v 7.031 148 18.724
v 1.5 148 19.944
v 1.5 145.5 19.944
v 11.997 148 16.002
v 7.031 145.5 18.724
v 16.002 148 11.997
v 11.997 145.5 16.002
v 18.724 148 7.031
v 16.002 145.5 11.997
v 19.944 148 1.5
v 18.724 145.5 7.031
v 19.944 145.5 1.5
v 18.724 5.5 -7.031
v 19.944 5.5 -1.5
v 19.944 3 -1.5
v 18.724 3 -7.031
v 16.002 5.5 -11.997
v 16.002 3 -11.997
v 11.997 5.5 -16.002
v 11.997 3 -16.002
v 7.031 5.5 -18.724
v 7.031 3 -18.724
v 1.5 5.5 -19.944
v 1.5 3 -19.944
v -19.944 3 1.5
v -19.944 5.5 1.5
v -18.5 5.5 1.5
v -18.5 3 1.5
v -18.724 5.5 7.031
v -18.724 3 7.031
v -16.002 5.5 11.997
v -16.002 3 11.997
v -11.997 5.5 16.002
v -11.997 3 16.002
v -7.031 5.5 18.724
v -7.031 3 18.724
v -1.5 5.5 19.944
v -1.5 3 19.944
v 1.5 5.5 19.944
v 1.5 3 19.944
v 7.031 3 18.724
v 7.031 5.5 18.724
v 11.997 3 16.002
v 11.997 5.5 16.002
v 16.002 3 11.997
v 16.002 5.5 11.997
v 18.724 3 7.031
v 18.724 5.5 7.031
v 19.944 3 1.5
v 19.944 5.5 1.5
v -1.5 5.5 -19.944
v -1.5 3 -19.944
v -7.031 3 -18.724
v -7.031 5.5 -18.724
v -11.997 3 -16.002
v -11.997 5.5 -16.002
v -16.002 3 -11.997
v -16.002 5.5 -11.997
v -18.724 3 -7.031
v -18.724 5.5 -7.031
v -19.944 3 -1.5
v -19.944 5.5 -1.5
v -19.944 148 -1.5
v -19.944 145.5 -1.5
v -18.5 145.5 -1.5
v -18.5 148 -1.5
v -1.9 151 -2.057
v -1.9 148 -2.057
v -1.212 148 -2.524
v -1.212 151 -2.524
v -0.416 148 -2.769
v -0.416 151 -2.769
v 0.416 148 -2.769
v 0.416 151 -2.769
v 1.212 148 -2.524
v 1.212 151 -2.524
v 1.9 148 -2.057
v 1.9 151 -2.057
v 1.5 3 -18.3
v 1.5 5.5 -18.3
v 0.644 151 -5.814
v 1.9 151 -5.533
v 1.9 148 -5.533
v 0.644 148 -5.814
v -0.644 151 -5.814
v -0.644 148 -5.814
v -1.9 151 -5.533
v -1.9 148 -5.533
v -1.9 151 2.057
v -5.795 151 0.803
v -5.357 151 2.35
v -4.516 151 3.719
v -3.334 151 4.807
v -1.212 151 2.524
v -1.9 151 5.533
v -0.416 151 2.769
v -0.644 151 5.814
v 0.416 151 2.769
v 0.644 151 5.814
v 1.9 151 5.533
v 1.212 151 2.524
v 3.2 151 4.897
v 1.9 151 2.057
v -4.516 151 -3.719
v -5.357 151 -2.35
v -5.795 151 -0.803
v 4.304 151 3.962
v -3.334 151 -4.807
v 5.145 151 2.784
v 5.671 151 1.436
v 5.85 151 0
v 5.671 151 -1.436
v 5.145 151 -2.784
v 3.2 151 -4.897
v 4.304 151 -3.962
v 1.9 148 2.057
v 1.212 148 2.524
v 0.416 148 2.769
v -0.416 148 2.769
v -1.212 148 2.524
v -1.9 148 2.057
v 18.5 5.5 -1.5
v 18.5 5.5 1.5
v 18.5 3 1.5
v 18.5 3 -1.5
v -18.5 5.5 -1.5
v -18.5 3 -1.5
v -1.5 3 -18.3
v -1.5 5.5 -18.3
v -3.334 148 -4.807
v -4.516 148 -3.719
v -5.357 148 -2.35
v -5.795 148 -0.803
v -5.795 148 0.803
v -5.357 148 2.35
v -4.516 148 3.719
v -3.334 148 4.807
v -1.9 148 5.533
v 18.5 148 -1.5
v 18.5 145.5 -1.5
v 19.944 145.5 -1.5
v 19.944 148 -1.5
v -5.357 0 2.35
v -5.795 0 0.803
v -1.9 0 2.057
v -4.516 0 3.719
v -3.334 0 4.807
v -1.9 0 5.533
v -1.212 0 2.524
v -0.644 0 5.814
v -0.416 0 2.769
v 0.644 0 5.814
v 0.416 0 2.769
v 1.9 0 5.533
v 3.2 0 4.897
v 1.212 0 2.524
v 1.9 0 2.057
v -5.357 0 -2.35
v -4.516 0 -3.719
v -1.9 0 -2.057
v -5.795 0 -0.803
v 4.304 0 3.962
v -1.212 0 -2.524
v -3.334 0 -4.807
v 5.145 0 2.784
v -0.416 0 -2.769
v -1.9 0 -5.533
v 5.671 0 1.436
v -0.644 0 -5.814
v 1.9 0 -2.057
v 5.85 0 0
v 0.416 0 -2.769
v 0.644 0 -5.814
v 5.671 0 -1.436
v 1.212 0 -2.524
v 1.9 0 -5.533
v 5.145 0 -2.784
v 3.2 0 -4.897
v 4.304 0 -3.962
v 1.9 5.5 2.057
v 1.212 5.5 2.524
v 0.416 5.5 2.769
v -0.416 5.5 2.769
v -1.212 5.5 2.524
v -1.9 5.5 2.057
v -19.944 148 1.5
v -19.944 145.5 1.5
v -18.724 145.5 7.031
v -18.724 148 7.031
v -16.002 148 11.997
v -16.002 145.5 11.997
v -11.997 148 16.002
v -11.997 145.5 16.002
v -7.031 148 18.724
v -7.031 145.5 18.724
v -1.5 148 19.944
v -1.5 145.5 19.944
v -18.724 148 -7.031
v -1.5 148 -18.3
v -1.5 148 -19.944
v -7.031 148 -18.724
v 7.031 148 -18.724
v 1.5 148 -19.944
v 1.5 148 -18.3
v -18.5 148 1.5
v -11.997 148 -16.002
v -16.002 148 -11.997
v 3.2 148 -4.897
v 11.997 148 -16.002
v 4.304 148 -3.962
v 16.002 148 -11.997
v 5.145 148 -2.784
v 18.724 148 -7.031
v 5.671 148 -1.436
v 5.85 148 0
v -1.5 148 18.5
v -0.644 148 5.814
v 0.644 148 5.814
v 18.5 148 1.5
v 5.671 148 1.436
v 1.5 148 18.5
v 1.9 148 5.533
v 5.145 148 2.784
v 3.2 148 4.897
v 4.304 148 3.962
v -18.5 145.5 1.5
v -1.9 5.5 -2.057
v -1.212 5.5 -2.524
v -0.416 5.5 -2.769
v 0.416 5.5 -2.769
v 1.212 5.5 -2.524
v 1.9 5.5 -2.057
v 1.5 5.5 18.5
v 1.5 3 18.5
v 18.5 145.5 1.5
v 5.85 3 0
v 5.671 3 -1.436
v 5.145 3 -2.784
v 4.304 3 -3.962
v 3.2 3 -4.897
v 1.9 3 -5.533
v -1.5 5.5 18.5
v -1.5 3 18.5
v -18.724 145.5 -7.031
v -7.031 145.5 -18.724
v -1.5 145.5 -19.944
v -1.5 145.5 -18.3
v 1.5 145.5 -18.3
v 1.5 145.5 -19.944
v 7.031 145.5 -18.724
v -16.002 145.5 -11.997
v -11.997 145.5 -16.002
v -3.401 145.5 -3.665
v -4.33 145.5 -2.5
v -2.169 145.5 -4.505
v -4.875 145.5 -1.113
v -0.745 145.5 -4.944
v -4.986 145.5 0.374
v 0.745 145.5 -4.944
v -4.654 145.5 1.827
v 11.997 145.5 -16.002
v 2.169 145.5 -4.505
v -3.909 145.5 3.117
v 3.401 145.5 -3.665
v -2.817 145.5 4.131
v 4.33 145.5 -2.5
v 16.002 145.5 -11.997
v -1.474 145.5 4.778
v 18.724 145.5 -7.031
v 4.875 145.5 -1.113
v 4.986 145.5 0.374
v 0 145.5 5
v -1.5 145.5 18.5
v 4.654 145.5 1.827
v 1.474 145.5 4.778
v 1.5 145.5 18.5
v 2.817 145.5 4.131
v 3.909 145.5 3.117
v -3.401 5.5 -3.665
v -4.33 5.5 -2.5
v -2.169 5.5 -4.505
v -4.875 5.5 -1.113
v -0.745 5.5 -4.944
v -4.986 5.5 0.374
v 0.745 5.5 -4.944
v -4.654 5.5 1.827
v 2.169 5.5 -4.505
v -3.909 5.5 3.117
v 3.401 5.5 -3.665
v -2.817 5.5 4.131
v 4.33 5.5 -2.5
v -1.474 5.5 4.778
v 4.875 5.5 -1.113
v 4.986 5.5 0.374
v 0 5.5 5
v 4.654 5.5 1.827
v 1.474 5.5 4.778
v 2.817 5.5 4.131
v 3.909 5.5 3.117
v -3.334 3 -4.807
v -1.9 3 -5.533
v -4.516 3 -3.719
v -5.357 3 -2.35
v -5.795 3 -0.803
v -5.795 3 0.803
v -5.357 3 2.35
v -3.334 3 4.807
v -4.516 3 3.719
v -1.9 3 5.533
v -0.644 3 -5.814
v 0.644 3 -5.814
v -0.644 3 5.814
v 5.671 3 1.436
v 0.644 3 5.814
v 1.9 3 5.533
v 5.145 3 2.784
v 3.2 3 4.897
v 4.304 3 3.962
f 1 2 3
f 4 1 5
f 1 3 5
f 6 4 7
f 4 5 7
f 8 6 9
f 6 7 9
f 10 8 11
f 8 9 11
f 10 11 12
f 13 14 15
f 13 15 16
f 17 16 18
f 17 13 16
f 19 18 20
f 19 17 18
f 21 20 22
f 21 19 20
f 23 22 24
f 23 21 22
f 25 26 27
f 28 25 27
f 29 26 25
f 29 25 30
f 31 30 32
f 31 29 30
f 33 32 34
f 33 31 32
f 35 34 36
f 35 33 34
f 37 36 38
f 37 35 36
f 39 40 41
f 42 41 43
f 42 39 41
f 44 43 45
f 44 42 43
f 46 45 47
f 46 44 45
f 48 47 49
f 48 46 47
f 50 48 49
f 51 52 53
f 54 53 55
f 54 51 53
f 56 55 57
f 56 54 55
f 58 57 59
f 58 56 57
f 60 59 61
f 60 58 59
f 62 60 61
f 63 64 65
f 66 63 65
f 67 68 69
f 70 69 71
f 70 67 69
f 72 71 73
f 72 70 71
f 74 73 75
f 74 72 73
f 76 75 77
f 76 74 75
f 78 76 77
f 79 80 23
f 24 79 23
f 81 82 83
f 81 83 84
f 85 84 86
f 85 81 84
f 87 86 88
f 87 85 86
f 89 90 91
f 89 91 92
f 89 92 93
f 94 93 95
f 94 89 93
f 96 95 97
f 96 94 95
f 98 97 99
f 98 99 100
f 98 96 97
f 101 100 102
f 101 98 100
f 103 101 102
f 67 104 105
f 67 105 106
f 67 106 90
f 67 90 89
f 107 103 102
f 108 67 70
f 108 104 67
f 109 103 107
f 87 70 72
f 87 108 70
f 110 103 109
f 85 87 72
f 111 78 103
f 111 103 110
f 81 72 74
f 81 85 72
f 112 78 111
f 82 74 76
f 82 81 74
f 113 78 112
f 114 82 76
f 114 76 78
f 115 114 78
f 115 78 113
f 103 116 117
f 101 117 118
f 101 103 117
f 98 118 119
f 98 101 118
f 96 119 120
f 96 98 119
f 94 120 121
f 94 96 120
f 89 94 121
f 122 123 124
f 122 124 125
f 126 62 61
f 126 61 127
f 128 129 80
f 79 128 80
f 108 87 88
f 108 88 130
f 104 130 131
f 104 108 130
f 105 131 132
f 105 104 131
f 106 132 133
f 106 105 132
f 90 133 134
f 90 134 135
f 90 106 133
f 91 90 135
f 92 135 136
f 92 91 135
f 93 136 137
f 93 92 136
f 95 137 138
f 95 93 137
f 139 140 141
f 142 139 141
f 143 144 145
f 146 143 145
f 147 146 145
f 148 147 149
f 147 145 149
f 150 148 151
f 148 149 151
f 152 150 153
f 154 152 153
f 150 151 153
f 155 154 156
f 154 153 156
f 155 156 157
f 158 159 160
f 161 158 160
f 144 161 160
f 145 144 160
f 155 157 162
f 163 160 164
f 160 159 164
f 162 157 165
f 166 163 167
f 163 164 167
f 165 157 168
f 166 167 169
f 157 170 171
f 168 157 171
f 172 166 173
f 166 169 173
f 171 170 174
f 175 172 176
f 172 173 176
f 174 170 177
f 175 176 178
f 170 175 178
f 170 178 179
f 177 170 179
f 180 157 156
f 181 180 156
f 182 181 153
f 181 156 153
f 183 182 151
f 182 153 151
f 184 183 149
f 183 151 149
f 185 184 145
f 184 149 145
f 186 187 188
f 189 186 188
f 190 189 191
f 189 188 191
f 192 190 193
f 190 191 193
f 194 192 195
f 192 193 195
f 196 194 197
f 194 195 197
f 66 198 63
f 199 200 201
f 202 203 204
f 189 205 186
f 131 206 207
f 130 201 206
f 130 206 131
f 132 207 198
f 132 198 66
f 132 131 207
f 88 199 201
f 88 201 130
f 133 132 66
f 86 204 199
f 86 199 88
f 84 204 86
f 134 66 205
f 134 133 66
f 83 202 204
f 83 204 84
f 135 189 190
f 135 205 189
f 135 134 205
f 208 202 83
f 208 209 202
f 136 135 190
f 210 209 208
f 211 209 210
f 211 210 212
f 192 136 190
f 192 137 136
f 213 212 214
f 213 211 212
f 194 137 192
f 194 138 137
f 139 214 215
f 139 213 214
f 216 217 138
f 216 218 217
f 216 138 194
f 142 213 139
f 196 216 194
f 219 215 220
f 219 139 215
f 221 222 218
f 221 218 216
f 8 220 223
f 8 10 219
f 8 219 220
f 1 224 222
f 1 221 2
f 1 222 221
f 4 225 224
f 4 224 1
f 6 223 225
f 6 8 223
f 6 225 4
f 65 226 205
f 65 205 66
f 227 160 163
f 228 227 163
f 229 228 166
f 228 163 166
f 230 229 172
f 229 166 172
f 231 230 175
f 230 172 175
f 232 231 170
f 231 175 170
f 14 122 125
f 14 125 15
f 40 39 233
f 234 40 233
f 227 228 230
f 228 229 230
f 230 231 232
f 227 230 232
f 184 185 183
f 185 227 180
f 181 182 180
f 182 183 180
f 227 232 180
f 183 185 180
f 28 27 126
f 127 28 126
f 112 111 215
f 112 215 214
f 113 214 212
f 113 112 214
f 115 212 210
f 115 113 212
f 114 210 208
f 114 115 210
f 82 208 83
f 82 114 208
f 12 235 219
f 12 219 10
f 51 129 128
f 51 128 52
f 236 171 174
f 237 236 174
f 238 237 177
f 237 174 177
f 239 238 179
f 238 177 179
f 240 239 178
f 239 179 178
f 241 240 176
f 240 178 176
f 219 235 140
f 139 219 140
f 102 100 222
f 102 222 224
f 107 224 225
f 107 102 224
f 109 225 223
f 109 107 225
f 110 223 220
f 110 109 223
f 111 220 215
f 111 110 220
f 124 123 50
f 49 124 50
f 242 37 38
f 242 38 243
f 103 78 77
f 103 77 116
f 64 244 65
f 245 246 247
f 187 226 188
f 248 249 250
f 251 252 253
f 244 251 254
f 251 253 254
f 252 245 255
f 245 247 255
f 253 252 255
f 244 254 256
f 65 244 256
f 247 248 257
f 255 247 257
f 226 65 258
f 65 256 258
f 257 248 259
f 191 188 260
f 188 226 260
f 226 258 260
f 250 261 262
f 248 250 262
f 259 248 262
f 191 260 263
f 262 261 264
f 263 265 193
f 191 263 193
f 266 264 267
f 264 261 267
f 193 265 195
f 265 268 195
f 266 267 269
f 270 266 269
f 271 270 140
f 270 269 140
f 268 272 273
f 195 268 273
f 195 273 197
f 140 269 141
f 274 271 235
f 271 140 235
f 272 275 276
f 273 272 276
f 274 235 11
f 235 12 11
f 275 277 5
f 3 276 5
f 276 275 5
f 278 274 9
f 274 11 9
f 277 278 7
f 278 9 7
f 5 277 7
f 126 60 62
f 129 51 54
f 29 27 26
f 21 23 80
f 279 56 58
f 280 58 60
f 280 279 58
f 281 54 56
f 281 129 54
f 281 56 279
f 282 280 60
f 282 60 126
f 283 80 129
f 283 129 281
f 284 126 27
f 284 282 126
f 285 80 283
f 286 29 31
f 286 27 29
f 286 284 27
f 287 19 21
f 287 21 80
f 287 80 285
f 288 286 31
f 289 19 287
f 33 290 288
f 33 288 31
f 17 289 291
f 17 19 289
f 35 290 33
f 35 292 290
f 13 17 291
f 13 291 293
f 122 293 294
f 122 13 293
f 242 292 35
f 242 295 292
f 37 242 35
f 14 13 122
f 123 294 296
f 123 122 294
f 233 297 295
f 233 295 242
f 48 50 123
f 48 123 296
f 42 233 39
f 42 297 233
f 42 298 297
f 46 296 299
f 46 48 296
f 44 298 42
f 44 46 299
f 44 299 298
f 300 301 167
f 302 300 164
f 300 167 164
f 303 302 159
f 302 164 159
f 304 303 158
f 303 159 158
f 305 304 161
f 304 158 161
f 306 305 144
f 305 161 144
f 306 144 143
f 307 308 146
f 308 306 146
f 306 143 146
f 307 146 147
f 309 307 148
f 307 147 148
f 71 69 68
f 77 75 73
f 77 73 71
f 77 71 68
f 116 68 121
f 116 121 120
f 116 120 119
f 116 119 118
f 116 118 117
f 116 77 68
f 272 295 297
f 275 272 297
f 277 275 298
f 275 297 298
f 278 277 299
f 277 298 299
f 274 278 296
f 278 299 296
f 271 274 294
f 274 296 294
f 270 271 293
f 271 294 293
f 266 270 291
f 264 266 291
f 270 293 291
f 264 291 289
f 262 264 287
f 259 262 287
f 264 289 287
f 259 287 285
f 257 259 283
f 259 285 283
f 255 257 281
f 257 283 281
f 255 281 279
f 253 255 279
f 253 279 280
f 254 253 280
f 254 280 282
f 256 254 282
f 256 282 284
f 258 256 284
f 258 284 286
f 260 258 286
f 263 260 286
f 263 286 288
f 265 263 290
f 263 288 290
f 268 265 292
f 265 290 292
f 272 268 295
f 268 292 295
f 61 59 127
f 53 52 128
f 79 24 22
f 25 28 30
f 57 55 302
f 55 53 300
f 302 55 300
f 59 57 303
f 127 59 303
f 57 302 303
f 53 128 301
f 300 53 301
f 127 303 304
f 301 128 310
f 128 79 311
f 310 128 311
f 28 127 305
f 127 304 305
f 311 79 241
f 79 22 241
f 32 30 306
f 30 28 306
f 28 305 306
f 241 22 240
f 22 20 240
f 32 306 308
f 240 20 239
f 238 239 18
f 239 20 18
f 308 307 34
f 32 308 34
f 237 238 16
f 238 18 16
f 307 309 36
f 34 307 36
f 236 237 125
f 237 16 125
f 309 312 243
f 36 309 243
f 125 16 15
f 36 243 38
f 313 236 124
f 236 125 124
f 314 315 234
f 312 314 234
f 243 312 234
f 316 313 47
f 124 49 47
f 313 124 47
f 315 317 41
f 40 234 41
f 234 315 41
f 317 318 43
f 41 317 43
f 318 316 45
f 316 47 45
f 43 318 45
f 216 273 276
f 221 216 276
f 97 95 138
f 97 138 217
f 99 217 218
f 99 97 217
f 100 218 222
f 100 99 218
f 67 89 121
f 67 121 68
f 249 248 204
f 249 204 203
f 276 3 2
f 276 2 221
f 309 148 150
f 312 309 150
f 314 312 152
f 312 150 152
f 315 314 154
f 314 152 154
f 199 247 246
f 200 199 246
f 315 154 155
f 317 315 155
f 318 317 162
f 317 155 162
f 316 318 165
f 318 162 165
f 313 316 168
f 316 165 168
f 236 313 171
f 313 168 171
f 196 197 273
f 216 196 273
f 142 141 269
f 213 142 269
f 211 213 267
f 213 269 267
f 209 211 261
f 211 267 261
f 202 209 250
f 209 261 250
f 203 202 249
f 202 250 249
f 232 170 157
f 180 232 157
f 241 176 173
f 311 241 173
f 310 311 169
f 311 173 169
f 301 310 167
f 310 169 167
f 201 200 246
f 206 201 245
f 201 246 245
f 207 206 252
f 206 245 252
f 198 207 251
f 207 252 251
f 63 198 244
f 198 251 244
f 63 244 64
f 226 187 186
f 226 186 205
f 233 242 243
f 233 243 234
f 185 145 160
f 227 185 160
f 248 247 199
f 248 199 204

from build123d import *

# Parameters (mm, degrees)
SKETCH1_R           = 5.85
BOSS_EXTRUDE1_DEPTH = 5.5
SKETCH2_R           = 20
BOSS_EXTRUDE2_DEPTH = 2.5
CUT_EXTRUDE1_DEPTH  = 8
SKETCH4_W           = 3
SKETCH4_H           = 3
CUT_EXTRUDE2_DEPTH  = 10
SKETCH5_R           = 5
BOSS_EXTRUDE3_DEPTH = 140


with BuildPart() as part:
    # Sketch1 → Boss-Extrude1 (new body)
    with BuildSketch(Plane(origin=(0, 0, 0), x_dir=(1, 0, 0), z_dir=(0, 1, 0))):
        Circle(SKETCH1_R)
        with BuildLine():
            Line((1.9, 2.05669638), (1.9, -2.05669638))
            ThreePointArc((1.9, -2.05669638), (0, -2.8), (-1.9, -2.05669638))
            Line((-1.9, -2.05669638), (-1.9, 2.05669638))
            ThreePointArc((-1.9, 2.05669638), (0, 2.8), (1.9, 2.05669638))
        make_face(mode=Mode.SUBTRACT)
    boss_extrude1 = extrude(amount=BOSS_EXTRUDE1_DEPTH)

    # Sketch2 → Boss-Extrude2 (add)
    with BuildSketch(Plane(origin=(0, 5.5, 0), x_dir=(1, 0, 0), z_dir=(0, 1, 0))):
        Circle(SKETCH2_R)
    boss_extrude2 = extrude(amount=-BOSS_EXTRUDE2_DEPTH)

    # Sketch3 → Cut-Extrude1 (cut)
    with BuildSketch(Plane.XZ.offset(-3)):
        with BuildLine():
            Line((-1.9, 2.05669638), (-1.9, -2.05669638))
            ThreePointArc((-1.9, -2.05669638), (0, -2.8), (1.9, -2.05669638))
            Line((1.9, -2.05669638), (1.9, 2.05669638))
            ThreePointArc((1.9, 2.05669638), (0, 2.8), (-1.9, 2.05669638))
        make_face()
    extrude(amount=-CUT_EXTRUDE1_DEPTH, mode=Mode.SUBTRACT)

    # Sketch4 → Cut-Extrude2 (cut)
    with BuildSketch(Plane(origin=(0, 5.5, 0), x_dir=(1, 0, 0), z_dir=(0, 1, 0))):
        with Locations((0, 19.8)):
            Rectangle(SKETCH4_W, SKETCH4_H)
        with Locations((20, 0)):
            Rectangle(SKETCH4_W, SKETCH4_H)
        with Locations((0, -20)):
            Rectangle(SKETCH4_W, SKETCH4_H)
        with Locations((-20, 0)):
            Rectangle(SKETCH4_W, SKETCH4_H)
    cut_extrude2 = extrude(amount=-CUT_EXTRUDE2_DEPTH, mode=Mode.SUBTRACT)

    # Sketch5 → Boss-Extrude3 (add)
    with BuildSketch(Plane(origin=(0, 5.5, 0), x_dir=(1, 0, 0), z_dir=(0, 1, 0))):
        Circle(SKETCH5_R)
    extrude(amount=BOSS_EXTRUDE3_DEPTH)

    # Mirror1: Boss-Extrude2 across plane
    add(boss_extrude2.mirror(Plane.ZX.offset(75.5)))

    # Mirror2: Boss-Extrude1, Cut-Extrude2 across plane
    add(boss_extrude1.mirror(Plane.ZX.offset(75.5)))
    add(cut_extrude2.mirror(Plane.ZX.offset(75.5)), mode=Mode.SUBTRACT)


solid = part.part
